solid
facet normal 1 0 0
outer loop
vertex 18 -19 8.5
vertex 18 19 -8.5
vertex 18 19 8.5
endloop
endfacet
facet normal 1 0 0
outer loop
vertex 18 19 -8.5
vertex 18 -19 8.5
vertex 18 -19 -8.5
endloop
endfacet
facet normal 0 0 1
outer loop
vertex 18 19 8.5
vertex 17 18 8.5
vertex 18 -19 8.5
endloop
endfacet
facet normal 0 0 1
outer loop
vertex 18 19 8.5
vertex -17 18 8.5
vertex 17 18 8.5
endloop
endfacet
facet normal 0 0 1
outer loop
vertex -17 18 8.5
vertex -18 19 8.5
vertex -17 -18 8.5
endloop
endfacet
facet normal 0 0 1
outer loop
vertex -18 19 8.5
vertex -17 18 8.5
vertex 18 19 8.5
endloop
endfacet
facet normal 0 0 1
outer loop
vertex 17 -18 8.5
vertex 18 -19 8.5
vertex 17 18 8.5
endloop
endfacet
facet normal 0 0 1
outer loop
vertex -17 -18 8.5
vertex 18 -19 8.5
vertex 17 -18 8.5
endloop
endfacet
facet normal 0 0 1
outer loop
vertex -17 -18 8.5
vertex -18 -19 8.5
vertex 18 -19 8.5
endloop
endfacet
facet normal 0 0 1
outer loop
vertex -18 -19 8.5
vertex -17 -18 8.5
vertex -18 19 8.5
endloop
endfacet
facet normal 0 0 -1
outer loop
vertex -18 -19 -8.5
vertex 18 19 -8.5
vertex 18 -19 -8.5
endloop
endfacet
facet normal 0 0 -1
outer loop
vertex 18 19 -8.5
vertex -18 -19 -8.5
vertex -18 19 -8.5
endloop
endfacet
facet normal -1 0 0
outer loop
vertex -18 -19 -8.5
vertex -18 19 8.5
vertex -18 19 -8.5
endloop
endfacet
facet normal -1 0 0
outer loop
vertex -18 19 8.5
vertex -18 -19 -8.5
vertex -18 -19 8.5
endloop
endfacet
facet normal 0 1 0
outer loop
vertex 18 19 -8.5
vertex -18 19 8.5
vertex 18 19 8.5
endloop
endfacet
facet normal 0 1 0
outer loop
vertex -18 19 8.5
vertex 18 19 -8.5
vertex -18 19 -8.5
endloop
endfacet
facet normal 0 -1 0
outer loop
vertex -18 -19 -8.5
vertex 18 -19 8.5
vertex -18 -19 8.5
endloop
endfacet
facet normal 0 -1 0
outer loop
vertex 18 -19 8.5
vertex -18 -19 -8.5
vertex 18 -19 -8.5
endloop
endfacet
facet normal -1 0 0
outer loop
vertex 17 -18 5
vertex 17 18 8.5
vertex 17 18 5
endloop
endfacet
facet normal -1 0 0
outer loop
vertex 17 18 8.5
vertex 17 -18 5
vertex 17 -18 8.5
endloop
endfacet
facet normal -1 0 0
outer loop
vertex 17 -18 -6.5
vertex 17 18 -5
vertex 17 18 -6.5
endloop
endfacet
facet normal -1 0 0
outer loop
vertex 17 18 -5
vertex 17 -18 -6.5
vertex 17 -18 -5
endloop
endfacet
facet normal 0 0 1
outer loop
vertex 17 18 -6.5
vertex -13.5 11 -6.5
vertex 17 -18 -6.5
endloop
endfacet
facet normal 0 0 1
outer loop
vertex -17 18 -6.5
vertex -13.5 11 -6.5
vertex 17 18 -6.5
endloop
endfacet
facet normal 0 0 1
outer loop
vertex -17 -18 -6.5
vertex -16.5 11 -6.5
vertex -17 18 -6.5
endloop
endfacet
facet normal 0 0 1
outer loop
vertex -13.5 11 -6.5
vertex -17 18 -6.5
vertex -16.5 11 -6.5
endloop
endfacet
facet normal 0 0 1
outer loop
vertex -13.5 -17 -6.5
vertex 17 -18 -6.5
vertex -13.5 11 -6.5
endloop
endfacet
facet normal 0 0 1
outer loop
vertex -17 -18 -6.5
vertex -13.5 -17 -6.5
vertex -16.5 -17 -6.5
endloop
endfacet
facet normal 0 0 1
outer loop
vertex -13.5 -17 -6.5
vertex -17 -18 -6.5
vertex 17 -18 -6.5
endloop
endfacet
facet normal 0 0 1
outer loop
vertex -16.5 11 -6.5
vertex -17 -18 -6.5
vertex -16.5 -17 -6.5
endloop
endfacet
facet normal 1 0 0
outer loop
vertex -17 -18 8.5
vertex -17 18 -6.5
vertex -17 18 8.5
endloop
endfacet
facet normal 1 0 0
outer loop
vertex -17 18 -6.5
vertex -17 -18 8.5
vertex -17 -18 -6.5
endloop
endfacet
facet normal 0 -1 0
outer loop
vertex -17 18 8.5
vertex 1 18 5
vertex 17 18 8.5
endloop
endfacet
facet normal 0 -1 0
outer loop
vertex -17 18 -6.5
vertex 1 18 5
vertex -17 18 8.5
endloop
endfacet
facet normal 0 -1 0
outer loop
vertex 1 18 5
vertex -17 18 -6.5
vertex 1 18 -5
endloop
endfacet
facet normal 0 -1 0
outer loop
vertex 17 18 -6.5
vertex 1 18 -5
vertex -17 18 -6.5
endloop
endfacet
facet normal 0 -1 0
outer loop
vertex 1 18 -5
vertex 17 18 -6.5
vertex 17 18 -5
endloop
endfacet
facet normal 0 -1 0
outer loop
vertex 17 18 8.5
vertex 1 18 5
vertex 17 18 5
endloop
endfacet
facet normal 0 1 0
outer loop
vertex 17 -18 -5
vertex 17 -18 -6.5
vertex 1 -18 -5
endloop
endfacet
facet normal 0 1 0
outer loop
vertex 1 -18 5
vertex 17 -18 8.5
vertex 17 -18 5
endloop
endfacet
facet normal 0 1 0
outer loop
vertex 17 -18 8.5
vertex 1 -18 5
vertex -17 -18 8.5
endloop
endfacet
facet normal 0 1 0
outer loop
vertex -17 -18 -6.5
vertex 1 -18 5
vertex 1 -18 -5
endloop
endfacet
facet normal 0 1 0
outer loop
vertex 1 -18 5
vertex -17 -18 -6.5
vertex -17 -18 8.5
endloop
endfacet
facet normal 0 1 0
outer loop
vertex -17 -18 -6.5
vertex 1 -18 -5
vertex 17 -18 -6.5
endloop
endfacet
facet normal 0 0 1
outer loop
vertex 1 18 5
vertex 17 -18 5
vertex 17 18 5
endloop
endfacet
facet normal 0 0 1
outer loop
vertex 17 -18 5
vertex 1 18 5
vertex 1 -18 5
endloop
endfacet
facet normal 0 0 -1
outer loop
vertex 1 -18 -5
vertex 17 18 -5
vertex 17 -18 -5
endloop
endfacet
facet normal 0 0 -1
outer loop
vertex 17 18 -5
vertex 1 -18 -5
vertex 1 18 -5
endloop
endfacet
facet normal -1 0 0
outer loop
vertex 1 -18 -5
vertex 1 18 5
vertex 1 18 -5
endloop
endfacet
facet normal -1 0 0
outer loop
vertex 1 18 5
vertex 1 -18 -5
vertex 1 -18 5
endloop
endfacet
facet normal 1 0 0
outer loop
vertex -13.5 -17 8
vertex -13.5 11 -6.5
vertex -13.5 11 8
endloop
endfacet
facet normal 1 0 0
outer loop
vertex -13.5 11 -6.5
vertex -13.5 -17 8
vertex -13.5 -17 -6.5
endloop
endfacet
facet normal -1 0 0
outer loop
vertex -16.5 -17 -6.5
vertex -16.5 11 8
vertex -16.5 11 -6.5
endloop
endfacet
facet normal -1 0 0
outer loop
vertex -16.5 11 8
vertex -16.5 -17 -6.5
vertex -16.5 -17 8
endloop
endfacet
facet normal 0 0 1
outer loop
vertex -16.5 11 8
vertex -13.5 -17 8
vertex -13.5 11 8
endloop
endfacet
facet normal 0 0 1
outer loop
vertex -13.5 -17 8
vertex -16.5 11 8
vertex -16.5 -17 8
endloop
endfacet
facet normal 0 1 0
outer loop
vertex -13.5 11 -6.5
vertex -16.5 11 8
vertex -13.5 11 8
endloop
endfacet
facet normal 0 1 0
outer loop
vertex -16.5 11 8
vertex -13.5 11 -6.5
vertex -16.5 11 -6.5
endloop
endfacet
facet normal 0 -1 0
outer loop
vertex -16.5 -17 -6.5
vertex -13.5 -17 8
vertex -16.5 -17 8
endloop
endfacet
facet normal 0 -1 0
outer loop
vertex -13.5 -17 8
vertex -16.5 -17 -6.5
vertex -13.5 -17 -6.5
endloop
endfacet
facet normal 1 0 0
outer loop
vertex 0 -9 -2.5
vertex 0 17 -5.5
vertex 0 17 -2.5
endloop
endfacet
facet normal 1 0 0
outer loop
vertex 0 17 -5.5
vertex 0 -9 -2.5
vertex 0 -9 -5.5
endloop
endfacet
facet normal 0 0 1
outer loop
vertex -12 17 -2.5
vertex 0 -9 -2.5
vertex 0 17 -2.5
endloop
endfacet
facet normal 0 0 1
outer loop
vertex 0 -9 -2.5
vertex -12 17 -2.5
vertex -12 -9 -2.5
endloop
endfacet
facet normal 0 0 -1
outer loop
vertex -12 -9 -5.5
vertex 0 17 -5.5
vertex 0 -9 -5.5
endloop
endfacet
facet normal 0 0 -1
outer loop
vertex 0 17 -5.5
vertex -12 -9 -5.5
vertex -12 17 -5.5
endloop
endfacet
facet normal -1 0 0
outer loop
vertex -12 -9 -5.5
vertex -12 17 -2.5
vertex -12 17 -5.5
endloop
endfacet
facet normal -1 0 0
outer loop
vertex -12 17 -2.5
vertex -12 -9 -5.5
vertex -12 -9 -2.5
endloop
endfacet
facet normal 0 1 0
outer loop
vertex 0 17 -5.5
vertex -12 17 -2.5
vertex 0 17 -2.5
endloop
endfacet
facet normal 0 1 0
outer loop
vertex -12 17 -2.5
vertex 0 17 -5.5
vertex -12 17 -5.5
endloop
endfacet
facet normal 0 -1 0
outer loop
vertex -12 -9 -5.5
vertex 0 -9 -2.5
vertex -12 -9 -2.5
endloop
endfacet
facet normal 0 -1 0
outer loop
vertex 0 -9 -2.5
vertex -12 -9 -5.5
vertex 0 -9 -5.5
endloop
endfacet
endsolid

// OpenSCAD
module ESP01()
{
  color("blue")
    cube([16, 28, 3], center=true);
}

module RegulatorBoard()
{
  color("red")
    cube([12, 26, 3], center=true);
}

module ReedSwitch()
{
  color("orange")
    cube([16, 36, 10], center=true);
}


inner_dimensions = [34, 36, 15];
wall_thickness = 2;

difference()
{
  cube(inner_dimensions + [wall_thickness, wall_thickness, wall_thickness], center=true);
  translate([0, 0, 2])
    cube(inner_dimensions + [0, 0, 2], center=true);
}

translate([9, 0, 0])
  ReedSwitch();

translate([-15, -3, 0])
  rotate([0, 90, 0])
    ESP01();

translate([-6, 4, -4])
  RegulatorBoard();
